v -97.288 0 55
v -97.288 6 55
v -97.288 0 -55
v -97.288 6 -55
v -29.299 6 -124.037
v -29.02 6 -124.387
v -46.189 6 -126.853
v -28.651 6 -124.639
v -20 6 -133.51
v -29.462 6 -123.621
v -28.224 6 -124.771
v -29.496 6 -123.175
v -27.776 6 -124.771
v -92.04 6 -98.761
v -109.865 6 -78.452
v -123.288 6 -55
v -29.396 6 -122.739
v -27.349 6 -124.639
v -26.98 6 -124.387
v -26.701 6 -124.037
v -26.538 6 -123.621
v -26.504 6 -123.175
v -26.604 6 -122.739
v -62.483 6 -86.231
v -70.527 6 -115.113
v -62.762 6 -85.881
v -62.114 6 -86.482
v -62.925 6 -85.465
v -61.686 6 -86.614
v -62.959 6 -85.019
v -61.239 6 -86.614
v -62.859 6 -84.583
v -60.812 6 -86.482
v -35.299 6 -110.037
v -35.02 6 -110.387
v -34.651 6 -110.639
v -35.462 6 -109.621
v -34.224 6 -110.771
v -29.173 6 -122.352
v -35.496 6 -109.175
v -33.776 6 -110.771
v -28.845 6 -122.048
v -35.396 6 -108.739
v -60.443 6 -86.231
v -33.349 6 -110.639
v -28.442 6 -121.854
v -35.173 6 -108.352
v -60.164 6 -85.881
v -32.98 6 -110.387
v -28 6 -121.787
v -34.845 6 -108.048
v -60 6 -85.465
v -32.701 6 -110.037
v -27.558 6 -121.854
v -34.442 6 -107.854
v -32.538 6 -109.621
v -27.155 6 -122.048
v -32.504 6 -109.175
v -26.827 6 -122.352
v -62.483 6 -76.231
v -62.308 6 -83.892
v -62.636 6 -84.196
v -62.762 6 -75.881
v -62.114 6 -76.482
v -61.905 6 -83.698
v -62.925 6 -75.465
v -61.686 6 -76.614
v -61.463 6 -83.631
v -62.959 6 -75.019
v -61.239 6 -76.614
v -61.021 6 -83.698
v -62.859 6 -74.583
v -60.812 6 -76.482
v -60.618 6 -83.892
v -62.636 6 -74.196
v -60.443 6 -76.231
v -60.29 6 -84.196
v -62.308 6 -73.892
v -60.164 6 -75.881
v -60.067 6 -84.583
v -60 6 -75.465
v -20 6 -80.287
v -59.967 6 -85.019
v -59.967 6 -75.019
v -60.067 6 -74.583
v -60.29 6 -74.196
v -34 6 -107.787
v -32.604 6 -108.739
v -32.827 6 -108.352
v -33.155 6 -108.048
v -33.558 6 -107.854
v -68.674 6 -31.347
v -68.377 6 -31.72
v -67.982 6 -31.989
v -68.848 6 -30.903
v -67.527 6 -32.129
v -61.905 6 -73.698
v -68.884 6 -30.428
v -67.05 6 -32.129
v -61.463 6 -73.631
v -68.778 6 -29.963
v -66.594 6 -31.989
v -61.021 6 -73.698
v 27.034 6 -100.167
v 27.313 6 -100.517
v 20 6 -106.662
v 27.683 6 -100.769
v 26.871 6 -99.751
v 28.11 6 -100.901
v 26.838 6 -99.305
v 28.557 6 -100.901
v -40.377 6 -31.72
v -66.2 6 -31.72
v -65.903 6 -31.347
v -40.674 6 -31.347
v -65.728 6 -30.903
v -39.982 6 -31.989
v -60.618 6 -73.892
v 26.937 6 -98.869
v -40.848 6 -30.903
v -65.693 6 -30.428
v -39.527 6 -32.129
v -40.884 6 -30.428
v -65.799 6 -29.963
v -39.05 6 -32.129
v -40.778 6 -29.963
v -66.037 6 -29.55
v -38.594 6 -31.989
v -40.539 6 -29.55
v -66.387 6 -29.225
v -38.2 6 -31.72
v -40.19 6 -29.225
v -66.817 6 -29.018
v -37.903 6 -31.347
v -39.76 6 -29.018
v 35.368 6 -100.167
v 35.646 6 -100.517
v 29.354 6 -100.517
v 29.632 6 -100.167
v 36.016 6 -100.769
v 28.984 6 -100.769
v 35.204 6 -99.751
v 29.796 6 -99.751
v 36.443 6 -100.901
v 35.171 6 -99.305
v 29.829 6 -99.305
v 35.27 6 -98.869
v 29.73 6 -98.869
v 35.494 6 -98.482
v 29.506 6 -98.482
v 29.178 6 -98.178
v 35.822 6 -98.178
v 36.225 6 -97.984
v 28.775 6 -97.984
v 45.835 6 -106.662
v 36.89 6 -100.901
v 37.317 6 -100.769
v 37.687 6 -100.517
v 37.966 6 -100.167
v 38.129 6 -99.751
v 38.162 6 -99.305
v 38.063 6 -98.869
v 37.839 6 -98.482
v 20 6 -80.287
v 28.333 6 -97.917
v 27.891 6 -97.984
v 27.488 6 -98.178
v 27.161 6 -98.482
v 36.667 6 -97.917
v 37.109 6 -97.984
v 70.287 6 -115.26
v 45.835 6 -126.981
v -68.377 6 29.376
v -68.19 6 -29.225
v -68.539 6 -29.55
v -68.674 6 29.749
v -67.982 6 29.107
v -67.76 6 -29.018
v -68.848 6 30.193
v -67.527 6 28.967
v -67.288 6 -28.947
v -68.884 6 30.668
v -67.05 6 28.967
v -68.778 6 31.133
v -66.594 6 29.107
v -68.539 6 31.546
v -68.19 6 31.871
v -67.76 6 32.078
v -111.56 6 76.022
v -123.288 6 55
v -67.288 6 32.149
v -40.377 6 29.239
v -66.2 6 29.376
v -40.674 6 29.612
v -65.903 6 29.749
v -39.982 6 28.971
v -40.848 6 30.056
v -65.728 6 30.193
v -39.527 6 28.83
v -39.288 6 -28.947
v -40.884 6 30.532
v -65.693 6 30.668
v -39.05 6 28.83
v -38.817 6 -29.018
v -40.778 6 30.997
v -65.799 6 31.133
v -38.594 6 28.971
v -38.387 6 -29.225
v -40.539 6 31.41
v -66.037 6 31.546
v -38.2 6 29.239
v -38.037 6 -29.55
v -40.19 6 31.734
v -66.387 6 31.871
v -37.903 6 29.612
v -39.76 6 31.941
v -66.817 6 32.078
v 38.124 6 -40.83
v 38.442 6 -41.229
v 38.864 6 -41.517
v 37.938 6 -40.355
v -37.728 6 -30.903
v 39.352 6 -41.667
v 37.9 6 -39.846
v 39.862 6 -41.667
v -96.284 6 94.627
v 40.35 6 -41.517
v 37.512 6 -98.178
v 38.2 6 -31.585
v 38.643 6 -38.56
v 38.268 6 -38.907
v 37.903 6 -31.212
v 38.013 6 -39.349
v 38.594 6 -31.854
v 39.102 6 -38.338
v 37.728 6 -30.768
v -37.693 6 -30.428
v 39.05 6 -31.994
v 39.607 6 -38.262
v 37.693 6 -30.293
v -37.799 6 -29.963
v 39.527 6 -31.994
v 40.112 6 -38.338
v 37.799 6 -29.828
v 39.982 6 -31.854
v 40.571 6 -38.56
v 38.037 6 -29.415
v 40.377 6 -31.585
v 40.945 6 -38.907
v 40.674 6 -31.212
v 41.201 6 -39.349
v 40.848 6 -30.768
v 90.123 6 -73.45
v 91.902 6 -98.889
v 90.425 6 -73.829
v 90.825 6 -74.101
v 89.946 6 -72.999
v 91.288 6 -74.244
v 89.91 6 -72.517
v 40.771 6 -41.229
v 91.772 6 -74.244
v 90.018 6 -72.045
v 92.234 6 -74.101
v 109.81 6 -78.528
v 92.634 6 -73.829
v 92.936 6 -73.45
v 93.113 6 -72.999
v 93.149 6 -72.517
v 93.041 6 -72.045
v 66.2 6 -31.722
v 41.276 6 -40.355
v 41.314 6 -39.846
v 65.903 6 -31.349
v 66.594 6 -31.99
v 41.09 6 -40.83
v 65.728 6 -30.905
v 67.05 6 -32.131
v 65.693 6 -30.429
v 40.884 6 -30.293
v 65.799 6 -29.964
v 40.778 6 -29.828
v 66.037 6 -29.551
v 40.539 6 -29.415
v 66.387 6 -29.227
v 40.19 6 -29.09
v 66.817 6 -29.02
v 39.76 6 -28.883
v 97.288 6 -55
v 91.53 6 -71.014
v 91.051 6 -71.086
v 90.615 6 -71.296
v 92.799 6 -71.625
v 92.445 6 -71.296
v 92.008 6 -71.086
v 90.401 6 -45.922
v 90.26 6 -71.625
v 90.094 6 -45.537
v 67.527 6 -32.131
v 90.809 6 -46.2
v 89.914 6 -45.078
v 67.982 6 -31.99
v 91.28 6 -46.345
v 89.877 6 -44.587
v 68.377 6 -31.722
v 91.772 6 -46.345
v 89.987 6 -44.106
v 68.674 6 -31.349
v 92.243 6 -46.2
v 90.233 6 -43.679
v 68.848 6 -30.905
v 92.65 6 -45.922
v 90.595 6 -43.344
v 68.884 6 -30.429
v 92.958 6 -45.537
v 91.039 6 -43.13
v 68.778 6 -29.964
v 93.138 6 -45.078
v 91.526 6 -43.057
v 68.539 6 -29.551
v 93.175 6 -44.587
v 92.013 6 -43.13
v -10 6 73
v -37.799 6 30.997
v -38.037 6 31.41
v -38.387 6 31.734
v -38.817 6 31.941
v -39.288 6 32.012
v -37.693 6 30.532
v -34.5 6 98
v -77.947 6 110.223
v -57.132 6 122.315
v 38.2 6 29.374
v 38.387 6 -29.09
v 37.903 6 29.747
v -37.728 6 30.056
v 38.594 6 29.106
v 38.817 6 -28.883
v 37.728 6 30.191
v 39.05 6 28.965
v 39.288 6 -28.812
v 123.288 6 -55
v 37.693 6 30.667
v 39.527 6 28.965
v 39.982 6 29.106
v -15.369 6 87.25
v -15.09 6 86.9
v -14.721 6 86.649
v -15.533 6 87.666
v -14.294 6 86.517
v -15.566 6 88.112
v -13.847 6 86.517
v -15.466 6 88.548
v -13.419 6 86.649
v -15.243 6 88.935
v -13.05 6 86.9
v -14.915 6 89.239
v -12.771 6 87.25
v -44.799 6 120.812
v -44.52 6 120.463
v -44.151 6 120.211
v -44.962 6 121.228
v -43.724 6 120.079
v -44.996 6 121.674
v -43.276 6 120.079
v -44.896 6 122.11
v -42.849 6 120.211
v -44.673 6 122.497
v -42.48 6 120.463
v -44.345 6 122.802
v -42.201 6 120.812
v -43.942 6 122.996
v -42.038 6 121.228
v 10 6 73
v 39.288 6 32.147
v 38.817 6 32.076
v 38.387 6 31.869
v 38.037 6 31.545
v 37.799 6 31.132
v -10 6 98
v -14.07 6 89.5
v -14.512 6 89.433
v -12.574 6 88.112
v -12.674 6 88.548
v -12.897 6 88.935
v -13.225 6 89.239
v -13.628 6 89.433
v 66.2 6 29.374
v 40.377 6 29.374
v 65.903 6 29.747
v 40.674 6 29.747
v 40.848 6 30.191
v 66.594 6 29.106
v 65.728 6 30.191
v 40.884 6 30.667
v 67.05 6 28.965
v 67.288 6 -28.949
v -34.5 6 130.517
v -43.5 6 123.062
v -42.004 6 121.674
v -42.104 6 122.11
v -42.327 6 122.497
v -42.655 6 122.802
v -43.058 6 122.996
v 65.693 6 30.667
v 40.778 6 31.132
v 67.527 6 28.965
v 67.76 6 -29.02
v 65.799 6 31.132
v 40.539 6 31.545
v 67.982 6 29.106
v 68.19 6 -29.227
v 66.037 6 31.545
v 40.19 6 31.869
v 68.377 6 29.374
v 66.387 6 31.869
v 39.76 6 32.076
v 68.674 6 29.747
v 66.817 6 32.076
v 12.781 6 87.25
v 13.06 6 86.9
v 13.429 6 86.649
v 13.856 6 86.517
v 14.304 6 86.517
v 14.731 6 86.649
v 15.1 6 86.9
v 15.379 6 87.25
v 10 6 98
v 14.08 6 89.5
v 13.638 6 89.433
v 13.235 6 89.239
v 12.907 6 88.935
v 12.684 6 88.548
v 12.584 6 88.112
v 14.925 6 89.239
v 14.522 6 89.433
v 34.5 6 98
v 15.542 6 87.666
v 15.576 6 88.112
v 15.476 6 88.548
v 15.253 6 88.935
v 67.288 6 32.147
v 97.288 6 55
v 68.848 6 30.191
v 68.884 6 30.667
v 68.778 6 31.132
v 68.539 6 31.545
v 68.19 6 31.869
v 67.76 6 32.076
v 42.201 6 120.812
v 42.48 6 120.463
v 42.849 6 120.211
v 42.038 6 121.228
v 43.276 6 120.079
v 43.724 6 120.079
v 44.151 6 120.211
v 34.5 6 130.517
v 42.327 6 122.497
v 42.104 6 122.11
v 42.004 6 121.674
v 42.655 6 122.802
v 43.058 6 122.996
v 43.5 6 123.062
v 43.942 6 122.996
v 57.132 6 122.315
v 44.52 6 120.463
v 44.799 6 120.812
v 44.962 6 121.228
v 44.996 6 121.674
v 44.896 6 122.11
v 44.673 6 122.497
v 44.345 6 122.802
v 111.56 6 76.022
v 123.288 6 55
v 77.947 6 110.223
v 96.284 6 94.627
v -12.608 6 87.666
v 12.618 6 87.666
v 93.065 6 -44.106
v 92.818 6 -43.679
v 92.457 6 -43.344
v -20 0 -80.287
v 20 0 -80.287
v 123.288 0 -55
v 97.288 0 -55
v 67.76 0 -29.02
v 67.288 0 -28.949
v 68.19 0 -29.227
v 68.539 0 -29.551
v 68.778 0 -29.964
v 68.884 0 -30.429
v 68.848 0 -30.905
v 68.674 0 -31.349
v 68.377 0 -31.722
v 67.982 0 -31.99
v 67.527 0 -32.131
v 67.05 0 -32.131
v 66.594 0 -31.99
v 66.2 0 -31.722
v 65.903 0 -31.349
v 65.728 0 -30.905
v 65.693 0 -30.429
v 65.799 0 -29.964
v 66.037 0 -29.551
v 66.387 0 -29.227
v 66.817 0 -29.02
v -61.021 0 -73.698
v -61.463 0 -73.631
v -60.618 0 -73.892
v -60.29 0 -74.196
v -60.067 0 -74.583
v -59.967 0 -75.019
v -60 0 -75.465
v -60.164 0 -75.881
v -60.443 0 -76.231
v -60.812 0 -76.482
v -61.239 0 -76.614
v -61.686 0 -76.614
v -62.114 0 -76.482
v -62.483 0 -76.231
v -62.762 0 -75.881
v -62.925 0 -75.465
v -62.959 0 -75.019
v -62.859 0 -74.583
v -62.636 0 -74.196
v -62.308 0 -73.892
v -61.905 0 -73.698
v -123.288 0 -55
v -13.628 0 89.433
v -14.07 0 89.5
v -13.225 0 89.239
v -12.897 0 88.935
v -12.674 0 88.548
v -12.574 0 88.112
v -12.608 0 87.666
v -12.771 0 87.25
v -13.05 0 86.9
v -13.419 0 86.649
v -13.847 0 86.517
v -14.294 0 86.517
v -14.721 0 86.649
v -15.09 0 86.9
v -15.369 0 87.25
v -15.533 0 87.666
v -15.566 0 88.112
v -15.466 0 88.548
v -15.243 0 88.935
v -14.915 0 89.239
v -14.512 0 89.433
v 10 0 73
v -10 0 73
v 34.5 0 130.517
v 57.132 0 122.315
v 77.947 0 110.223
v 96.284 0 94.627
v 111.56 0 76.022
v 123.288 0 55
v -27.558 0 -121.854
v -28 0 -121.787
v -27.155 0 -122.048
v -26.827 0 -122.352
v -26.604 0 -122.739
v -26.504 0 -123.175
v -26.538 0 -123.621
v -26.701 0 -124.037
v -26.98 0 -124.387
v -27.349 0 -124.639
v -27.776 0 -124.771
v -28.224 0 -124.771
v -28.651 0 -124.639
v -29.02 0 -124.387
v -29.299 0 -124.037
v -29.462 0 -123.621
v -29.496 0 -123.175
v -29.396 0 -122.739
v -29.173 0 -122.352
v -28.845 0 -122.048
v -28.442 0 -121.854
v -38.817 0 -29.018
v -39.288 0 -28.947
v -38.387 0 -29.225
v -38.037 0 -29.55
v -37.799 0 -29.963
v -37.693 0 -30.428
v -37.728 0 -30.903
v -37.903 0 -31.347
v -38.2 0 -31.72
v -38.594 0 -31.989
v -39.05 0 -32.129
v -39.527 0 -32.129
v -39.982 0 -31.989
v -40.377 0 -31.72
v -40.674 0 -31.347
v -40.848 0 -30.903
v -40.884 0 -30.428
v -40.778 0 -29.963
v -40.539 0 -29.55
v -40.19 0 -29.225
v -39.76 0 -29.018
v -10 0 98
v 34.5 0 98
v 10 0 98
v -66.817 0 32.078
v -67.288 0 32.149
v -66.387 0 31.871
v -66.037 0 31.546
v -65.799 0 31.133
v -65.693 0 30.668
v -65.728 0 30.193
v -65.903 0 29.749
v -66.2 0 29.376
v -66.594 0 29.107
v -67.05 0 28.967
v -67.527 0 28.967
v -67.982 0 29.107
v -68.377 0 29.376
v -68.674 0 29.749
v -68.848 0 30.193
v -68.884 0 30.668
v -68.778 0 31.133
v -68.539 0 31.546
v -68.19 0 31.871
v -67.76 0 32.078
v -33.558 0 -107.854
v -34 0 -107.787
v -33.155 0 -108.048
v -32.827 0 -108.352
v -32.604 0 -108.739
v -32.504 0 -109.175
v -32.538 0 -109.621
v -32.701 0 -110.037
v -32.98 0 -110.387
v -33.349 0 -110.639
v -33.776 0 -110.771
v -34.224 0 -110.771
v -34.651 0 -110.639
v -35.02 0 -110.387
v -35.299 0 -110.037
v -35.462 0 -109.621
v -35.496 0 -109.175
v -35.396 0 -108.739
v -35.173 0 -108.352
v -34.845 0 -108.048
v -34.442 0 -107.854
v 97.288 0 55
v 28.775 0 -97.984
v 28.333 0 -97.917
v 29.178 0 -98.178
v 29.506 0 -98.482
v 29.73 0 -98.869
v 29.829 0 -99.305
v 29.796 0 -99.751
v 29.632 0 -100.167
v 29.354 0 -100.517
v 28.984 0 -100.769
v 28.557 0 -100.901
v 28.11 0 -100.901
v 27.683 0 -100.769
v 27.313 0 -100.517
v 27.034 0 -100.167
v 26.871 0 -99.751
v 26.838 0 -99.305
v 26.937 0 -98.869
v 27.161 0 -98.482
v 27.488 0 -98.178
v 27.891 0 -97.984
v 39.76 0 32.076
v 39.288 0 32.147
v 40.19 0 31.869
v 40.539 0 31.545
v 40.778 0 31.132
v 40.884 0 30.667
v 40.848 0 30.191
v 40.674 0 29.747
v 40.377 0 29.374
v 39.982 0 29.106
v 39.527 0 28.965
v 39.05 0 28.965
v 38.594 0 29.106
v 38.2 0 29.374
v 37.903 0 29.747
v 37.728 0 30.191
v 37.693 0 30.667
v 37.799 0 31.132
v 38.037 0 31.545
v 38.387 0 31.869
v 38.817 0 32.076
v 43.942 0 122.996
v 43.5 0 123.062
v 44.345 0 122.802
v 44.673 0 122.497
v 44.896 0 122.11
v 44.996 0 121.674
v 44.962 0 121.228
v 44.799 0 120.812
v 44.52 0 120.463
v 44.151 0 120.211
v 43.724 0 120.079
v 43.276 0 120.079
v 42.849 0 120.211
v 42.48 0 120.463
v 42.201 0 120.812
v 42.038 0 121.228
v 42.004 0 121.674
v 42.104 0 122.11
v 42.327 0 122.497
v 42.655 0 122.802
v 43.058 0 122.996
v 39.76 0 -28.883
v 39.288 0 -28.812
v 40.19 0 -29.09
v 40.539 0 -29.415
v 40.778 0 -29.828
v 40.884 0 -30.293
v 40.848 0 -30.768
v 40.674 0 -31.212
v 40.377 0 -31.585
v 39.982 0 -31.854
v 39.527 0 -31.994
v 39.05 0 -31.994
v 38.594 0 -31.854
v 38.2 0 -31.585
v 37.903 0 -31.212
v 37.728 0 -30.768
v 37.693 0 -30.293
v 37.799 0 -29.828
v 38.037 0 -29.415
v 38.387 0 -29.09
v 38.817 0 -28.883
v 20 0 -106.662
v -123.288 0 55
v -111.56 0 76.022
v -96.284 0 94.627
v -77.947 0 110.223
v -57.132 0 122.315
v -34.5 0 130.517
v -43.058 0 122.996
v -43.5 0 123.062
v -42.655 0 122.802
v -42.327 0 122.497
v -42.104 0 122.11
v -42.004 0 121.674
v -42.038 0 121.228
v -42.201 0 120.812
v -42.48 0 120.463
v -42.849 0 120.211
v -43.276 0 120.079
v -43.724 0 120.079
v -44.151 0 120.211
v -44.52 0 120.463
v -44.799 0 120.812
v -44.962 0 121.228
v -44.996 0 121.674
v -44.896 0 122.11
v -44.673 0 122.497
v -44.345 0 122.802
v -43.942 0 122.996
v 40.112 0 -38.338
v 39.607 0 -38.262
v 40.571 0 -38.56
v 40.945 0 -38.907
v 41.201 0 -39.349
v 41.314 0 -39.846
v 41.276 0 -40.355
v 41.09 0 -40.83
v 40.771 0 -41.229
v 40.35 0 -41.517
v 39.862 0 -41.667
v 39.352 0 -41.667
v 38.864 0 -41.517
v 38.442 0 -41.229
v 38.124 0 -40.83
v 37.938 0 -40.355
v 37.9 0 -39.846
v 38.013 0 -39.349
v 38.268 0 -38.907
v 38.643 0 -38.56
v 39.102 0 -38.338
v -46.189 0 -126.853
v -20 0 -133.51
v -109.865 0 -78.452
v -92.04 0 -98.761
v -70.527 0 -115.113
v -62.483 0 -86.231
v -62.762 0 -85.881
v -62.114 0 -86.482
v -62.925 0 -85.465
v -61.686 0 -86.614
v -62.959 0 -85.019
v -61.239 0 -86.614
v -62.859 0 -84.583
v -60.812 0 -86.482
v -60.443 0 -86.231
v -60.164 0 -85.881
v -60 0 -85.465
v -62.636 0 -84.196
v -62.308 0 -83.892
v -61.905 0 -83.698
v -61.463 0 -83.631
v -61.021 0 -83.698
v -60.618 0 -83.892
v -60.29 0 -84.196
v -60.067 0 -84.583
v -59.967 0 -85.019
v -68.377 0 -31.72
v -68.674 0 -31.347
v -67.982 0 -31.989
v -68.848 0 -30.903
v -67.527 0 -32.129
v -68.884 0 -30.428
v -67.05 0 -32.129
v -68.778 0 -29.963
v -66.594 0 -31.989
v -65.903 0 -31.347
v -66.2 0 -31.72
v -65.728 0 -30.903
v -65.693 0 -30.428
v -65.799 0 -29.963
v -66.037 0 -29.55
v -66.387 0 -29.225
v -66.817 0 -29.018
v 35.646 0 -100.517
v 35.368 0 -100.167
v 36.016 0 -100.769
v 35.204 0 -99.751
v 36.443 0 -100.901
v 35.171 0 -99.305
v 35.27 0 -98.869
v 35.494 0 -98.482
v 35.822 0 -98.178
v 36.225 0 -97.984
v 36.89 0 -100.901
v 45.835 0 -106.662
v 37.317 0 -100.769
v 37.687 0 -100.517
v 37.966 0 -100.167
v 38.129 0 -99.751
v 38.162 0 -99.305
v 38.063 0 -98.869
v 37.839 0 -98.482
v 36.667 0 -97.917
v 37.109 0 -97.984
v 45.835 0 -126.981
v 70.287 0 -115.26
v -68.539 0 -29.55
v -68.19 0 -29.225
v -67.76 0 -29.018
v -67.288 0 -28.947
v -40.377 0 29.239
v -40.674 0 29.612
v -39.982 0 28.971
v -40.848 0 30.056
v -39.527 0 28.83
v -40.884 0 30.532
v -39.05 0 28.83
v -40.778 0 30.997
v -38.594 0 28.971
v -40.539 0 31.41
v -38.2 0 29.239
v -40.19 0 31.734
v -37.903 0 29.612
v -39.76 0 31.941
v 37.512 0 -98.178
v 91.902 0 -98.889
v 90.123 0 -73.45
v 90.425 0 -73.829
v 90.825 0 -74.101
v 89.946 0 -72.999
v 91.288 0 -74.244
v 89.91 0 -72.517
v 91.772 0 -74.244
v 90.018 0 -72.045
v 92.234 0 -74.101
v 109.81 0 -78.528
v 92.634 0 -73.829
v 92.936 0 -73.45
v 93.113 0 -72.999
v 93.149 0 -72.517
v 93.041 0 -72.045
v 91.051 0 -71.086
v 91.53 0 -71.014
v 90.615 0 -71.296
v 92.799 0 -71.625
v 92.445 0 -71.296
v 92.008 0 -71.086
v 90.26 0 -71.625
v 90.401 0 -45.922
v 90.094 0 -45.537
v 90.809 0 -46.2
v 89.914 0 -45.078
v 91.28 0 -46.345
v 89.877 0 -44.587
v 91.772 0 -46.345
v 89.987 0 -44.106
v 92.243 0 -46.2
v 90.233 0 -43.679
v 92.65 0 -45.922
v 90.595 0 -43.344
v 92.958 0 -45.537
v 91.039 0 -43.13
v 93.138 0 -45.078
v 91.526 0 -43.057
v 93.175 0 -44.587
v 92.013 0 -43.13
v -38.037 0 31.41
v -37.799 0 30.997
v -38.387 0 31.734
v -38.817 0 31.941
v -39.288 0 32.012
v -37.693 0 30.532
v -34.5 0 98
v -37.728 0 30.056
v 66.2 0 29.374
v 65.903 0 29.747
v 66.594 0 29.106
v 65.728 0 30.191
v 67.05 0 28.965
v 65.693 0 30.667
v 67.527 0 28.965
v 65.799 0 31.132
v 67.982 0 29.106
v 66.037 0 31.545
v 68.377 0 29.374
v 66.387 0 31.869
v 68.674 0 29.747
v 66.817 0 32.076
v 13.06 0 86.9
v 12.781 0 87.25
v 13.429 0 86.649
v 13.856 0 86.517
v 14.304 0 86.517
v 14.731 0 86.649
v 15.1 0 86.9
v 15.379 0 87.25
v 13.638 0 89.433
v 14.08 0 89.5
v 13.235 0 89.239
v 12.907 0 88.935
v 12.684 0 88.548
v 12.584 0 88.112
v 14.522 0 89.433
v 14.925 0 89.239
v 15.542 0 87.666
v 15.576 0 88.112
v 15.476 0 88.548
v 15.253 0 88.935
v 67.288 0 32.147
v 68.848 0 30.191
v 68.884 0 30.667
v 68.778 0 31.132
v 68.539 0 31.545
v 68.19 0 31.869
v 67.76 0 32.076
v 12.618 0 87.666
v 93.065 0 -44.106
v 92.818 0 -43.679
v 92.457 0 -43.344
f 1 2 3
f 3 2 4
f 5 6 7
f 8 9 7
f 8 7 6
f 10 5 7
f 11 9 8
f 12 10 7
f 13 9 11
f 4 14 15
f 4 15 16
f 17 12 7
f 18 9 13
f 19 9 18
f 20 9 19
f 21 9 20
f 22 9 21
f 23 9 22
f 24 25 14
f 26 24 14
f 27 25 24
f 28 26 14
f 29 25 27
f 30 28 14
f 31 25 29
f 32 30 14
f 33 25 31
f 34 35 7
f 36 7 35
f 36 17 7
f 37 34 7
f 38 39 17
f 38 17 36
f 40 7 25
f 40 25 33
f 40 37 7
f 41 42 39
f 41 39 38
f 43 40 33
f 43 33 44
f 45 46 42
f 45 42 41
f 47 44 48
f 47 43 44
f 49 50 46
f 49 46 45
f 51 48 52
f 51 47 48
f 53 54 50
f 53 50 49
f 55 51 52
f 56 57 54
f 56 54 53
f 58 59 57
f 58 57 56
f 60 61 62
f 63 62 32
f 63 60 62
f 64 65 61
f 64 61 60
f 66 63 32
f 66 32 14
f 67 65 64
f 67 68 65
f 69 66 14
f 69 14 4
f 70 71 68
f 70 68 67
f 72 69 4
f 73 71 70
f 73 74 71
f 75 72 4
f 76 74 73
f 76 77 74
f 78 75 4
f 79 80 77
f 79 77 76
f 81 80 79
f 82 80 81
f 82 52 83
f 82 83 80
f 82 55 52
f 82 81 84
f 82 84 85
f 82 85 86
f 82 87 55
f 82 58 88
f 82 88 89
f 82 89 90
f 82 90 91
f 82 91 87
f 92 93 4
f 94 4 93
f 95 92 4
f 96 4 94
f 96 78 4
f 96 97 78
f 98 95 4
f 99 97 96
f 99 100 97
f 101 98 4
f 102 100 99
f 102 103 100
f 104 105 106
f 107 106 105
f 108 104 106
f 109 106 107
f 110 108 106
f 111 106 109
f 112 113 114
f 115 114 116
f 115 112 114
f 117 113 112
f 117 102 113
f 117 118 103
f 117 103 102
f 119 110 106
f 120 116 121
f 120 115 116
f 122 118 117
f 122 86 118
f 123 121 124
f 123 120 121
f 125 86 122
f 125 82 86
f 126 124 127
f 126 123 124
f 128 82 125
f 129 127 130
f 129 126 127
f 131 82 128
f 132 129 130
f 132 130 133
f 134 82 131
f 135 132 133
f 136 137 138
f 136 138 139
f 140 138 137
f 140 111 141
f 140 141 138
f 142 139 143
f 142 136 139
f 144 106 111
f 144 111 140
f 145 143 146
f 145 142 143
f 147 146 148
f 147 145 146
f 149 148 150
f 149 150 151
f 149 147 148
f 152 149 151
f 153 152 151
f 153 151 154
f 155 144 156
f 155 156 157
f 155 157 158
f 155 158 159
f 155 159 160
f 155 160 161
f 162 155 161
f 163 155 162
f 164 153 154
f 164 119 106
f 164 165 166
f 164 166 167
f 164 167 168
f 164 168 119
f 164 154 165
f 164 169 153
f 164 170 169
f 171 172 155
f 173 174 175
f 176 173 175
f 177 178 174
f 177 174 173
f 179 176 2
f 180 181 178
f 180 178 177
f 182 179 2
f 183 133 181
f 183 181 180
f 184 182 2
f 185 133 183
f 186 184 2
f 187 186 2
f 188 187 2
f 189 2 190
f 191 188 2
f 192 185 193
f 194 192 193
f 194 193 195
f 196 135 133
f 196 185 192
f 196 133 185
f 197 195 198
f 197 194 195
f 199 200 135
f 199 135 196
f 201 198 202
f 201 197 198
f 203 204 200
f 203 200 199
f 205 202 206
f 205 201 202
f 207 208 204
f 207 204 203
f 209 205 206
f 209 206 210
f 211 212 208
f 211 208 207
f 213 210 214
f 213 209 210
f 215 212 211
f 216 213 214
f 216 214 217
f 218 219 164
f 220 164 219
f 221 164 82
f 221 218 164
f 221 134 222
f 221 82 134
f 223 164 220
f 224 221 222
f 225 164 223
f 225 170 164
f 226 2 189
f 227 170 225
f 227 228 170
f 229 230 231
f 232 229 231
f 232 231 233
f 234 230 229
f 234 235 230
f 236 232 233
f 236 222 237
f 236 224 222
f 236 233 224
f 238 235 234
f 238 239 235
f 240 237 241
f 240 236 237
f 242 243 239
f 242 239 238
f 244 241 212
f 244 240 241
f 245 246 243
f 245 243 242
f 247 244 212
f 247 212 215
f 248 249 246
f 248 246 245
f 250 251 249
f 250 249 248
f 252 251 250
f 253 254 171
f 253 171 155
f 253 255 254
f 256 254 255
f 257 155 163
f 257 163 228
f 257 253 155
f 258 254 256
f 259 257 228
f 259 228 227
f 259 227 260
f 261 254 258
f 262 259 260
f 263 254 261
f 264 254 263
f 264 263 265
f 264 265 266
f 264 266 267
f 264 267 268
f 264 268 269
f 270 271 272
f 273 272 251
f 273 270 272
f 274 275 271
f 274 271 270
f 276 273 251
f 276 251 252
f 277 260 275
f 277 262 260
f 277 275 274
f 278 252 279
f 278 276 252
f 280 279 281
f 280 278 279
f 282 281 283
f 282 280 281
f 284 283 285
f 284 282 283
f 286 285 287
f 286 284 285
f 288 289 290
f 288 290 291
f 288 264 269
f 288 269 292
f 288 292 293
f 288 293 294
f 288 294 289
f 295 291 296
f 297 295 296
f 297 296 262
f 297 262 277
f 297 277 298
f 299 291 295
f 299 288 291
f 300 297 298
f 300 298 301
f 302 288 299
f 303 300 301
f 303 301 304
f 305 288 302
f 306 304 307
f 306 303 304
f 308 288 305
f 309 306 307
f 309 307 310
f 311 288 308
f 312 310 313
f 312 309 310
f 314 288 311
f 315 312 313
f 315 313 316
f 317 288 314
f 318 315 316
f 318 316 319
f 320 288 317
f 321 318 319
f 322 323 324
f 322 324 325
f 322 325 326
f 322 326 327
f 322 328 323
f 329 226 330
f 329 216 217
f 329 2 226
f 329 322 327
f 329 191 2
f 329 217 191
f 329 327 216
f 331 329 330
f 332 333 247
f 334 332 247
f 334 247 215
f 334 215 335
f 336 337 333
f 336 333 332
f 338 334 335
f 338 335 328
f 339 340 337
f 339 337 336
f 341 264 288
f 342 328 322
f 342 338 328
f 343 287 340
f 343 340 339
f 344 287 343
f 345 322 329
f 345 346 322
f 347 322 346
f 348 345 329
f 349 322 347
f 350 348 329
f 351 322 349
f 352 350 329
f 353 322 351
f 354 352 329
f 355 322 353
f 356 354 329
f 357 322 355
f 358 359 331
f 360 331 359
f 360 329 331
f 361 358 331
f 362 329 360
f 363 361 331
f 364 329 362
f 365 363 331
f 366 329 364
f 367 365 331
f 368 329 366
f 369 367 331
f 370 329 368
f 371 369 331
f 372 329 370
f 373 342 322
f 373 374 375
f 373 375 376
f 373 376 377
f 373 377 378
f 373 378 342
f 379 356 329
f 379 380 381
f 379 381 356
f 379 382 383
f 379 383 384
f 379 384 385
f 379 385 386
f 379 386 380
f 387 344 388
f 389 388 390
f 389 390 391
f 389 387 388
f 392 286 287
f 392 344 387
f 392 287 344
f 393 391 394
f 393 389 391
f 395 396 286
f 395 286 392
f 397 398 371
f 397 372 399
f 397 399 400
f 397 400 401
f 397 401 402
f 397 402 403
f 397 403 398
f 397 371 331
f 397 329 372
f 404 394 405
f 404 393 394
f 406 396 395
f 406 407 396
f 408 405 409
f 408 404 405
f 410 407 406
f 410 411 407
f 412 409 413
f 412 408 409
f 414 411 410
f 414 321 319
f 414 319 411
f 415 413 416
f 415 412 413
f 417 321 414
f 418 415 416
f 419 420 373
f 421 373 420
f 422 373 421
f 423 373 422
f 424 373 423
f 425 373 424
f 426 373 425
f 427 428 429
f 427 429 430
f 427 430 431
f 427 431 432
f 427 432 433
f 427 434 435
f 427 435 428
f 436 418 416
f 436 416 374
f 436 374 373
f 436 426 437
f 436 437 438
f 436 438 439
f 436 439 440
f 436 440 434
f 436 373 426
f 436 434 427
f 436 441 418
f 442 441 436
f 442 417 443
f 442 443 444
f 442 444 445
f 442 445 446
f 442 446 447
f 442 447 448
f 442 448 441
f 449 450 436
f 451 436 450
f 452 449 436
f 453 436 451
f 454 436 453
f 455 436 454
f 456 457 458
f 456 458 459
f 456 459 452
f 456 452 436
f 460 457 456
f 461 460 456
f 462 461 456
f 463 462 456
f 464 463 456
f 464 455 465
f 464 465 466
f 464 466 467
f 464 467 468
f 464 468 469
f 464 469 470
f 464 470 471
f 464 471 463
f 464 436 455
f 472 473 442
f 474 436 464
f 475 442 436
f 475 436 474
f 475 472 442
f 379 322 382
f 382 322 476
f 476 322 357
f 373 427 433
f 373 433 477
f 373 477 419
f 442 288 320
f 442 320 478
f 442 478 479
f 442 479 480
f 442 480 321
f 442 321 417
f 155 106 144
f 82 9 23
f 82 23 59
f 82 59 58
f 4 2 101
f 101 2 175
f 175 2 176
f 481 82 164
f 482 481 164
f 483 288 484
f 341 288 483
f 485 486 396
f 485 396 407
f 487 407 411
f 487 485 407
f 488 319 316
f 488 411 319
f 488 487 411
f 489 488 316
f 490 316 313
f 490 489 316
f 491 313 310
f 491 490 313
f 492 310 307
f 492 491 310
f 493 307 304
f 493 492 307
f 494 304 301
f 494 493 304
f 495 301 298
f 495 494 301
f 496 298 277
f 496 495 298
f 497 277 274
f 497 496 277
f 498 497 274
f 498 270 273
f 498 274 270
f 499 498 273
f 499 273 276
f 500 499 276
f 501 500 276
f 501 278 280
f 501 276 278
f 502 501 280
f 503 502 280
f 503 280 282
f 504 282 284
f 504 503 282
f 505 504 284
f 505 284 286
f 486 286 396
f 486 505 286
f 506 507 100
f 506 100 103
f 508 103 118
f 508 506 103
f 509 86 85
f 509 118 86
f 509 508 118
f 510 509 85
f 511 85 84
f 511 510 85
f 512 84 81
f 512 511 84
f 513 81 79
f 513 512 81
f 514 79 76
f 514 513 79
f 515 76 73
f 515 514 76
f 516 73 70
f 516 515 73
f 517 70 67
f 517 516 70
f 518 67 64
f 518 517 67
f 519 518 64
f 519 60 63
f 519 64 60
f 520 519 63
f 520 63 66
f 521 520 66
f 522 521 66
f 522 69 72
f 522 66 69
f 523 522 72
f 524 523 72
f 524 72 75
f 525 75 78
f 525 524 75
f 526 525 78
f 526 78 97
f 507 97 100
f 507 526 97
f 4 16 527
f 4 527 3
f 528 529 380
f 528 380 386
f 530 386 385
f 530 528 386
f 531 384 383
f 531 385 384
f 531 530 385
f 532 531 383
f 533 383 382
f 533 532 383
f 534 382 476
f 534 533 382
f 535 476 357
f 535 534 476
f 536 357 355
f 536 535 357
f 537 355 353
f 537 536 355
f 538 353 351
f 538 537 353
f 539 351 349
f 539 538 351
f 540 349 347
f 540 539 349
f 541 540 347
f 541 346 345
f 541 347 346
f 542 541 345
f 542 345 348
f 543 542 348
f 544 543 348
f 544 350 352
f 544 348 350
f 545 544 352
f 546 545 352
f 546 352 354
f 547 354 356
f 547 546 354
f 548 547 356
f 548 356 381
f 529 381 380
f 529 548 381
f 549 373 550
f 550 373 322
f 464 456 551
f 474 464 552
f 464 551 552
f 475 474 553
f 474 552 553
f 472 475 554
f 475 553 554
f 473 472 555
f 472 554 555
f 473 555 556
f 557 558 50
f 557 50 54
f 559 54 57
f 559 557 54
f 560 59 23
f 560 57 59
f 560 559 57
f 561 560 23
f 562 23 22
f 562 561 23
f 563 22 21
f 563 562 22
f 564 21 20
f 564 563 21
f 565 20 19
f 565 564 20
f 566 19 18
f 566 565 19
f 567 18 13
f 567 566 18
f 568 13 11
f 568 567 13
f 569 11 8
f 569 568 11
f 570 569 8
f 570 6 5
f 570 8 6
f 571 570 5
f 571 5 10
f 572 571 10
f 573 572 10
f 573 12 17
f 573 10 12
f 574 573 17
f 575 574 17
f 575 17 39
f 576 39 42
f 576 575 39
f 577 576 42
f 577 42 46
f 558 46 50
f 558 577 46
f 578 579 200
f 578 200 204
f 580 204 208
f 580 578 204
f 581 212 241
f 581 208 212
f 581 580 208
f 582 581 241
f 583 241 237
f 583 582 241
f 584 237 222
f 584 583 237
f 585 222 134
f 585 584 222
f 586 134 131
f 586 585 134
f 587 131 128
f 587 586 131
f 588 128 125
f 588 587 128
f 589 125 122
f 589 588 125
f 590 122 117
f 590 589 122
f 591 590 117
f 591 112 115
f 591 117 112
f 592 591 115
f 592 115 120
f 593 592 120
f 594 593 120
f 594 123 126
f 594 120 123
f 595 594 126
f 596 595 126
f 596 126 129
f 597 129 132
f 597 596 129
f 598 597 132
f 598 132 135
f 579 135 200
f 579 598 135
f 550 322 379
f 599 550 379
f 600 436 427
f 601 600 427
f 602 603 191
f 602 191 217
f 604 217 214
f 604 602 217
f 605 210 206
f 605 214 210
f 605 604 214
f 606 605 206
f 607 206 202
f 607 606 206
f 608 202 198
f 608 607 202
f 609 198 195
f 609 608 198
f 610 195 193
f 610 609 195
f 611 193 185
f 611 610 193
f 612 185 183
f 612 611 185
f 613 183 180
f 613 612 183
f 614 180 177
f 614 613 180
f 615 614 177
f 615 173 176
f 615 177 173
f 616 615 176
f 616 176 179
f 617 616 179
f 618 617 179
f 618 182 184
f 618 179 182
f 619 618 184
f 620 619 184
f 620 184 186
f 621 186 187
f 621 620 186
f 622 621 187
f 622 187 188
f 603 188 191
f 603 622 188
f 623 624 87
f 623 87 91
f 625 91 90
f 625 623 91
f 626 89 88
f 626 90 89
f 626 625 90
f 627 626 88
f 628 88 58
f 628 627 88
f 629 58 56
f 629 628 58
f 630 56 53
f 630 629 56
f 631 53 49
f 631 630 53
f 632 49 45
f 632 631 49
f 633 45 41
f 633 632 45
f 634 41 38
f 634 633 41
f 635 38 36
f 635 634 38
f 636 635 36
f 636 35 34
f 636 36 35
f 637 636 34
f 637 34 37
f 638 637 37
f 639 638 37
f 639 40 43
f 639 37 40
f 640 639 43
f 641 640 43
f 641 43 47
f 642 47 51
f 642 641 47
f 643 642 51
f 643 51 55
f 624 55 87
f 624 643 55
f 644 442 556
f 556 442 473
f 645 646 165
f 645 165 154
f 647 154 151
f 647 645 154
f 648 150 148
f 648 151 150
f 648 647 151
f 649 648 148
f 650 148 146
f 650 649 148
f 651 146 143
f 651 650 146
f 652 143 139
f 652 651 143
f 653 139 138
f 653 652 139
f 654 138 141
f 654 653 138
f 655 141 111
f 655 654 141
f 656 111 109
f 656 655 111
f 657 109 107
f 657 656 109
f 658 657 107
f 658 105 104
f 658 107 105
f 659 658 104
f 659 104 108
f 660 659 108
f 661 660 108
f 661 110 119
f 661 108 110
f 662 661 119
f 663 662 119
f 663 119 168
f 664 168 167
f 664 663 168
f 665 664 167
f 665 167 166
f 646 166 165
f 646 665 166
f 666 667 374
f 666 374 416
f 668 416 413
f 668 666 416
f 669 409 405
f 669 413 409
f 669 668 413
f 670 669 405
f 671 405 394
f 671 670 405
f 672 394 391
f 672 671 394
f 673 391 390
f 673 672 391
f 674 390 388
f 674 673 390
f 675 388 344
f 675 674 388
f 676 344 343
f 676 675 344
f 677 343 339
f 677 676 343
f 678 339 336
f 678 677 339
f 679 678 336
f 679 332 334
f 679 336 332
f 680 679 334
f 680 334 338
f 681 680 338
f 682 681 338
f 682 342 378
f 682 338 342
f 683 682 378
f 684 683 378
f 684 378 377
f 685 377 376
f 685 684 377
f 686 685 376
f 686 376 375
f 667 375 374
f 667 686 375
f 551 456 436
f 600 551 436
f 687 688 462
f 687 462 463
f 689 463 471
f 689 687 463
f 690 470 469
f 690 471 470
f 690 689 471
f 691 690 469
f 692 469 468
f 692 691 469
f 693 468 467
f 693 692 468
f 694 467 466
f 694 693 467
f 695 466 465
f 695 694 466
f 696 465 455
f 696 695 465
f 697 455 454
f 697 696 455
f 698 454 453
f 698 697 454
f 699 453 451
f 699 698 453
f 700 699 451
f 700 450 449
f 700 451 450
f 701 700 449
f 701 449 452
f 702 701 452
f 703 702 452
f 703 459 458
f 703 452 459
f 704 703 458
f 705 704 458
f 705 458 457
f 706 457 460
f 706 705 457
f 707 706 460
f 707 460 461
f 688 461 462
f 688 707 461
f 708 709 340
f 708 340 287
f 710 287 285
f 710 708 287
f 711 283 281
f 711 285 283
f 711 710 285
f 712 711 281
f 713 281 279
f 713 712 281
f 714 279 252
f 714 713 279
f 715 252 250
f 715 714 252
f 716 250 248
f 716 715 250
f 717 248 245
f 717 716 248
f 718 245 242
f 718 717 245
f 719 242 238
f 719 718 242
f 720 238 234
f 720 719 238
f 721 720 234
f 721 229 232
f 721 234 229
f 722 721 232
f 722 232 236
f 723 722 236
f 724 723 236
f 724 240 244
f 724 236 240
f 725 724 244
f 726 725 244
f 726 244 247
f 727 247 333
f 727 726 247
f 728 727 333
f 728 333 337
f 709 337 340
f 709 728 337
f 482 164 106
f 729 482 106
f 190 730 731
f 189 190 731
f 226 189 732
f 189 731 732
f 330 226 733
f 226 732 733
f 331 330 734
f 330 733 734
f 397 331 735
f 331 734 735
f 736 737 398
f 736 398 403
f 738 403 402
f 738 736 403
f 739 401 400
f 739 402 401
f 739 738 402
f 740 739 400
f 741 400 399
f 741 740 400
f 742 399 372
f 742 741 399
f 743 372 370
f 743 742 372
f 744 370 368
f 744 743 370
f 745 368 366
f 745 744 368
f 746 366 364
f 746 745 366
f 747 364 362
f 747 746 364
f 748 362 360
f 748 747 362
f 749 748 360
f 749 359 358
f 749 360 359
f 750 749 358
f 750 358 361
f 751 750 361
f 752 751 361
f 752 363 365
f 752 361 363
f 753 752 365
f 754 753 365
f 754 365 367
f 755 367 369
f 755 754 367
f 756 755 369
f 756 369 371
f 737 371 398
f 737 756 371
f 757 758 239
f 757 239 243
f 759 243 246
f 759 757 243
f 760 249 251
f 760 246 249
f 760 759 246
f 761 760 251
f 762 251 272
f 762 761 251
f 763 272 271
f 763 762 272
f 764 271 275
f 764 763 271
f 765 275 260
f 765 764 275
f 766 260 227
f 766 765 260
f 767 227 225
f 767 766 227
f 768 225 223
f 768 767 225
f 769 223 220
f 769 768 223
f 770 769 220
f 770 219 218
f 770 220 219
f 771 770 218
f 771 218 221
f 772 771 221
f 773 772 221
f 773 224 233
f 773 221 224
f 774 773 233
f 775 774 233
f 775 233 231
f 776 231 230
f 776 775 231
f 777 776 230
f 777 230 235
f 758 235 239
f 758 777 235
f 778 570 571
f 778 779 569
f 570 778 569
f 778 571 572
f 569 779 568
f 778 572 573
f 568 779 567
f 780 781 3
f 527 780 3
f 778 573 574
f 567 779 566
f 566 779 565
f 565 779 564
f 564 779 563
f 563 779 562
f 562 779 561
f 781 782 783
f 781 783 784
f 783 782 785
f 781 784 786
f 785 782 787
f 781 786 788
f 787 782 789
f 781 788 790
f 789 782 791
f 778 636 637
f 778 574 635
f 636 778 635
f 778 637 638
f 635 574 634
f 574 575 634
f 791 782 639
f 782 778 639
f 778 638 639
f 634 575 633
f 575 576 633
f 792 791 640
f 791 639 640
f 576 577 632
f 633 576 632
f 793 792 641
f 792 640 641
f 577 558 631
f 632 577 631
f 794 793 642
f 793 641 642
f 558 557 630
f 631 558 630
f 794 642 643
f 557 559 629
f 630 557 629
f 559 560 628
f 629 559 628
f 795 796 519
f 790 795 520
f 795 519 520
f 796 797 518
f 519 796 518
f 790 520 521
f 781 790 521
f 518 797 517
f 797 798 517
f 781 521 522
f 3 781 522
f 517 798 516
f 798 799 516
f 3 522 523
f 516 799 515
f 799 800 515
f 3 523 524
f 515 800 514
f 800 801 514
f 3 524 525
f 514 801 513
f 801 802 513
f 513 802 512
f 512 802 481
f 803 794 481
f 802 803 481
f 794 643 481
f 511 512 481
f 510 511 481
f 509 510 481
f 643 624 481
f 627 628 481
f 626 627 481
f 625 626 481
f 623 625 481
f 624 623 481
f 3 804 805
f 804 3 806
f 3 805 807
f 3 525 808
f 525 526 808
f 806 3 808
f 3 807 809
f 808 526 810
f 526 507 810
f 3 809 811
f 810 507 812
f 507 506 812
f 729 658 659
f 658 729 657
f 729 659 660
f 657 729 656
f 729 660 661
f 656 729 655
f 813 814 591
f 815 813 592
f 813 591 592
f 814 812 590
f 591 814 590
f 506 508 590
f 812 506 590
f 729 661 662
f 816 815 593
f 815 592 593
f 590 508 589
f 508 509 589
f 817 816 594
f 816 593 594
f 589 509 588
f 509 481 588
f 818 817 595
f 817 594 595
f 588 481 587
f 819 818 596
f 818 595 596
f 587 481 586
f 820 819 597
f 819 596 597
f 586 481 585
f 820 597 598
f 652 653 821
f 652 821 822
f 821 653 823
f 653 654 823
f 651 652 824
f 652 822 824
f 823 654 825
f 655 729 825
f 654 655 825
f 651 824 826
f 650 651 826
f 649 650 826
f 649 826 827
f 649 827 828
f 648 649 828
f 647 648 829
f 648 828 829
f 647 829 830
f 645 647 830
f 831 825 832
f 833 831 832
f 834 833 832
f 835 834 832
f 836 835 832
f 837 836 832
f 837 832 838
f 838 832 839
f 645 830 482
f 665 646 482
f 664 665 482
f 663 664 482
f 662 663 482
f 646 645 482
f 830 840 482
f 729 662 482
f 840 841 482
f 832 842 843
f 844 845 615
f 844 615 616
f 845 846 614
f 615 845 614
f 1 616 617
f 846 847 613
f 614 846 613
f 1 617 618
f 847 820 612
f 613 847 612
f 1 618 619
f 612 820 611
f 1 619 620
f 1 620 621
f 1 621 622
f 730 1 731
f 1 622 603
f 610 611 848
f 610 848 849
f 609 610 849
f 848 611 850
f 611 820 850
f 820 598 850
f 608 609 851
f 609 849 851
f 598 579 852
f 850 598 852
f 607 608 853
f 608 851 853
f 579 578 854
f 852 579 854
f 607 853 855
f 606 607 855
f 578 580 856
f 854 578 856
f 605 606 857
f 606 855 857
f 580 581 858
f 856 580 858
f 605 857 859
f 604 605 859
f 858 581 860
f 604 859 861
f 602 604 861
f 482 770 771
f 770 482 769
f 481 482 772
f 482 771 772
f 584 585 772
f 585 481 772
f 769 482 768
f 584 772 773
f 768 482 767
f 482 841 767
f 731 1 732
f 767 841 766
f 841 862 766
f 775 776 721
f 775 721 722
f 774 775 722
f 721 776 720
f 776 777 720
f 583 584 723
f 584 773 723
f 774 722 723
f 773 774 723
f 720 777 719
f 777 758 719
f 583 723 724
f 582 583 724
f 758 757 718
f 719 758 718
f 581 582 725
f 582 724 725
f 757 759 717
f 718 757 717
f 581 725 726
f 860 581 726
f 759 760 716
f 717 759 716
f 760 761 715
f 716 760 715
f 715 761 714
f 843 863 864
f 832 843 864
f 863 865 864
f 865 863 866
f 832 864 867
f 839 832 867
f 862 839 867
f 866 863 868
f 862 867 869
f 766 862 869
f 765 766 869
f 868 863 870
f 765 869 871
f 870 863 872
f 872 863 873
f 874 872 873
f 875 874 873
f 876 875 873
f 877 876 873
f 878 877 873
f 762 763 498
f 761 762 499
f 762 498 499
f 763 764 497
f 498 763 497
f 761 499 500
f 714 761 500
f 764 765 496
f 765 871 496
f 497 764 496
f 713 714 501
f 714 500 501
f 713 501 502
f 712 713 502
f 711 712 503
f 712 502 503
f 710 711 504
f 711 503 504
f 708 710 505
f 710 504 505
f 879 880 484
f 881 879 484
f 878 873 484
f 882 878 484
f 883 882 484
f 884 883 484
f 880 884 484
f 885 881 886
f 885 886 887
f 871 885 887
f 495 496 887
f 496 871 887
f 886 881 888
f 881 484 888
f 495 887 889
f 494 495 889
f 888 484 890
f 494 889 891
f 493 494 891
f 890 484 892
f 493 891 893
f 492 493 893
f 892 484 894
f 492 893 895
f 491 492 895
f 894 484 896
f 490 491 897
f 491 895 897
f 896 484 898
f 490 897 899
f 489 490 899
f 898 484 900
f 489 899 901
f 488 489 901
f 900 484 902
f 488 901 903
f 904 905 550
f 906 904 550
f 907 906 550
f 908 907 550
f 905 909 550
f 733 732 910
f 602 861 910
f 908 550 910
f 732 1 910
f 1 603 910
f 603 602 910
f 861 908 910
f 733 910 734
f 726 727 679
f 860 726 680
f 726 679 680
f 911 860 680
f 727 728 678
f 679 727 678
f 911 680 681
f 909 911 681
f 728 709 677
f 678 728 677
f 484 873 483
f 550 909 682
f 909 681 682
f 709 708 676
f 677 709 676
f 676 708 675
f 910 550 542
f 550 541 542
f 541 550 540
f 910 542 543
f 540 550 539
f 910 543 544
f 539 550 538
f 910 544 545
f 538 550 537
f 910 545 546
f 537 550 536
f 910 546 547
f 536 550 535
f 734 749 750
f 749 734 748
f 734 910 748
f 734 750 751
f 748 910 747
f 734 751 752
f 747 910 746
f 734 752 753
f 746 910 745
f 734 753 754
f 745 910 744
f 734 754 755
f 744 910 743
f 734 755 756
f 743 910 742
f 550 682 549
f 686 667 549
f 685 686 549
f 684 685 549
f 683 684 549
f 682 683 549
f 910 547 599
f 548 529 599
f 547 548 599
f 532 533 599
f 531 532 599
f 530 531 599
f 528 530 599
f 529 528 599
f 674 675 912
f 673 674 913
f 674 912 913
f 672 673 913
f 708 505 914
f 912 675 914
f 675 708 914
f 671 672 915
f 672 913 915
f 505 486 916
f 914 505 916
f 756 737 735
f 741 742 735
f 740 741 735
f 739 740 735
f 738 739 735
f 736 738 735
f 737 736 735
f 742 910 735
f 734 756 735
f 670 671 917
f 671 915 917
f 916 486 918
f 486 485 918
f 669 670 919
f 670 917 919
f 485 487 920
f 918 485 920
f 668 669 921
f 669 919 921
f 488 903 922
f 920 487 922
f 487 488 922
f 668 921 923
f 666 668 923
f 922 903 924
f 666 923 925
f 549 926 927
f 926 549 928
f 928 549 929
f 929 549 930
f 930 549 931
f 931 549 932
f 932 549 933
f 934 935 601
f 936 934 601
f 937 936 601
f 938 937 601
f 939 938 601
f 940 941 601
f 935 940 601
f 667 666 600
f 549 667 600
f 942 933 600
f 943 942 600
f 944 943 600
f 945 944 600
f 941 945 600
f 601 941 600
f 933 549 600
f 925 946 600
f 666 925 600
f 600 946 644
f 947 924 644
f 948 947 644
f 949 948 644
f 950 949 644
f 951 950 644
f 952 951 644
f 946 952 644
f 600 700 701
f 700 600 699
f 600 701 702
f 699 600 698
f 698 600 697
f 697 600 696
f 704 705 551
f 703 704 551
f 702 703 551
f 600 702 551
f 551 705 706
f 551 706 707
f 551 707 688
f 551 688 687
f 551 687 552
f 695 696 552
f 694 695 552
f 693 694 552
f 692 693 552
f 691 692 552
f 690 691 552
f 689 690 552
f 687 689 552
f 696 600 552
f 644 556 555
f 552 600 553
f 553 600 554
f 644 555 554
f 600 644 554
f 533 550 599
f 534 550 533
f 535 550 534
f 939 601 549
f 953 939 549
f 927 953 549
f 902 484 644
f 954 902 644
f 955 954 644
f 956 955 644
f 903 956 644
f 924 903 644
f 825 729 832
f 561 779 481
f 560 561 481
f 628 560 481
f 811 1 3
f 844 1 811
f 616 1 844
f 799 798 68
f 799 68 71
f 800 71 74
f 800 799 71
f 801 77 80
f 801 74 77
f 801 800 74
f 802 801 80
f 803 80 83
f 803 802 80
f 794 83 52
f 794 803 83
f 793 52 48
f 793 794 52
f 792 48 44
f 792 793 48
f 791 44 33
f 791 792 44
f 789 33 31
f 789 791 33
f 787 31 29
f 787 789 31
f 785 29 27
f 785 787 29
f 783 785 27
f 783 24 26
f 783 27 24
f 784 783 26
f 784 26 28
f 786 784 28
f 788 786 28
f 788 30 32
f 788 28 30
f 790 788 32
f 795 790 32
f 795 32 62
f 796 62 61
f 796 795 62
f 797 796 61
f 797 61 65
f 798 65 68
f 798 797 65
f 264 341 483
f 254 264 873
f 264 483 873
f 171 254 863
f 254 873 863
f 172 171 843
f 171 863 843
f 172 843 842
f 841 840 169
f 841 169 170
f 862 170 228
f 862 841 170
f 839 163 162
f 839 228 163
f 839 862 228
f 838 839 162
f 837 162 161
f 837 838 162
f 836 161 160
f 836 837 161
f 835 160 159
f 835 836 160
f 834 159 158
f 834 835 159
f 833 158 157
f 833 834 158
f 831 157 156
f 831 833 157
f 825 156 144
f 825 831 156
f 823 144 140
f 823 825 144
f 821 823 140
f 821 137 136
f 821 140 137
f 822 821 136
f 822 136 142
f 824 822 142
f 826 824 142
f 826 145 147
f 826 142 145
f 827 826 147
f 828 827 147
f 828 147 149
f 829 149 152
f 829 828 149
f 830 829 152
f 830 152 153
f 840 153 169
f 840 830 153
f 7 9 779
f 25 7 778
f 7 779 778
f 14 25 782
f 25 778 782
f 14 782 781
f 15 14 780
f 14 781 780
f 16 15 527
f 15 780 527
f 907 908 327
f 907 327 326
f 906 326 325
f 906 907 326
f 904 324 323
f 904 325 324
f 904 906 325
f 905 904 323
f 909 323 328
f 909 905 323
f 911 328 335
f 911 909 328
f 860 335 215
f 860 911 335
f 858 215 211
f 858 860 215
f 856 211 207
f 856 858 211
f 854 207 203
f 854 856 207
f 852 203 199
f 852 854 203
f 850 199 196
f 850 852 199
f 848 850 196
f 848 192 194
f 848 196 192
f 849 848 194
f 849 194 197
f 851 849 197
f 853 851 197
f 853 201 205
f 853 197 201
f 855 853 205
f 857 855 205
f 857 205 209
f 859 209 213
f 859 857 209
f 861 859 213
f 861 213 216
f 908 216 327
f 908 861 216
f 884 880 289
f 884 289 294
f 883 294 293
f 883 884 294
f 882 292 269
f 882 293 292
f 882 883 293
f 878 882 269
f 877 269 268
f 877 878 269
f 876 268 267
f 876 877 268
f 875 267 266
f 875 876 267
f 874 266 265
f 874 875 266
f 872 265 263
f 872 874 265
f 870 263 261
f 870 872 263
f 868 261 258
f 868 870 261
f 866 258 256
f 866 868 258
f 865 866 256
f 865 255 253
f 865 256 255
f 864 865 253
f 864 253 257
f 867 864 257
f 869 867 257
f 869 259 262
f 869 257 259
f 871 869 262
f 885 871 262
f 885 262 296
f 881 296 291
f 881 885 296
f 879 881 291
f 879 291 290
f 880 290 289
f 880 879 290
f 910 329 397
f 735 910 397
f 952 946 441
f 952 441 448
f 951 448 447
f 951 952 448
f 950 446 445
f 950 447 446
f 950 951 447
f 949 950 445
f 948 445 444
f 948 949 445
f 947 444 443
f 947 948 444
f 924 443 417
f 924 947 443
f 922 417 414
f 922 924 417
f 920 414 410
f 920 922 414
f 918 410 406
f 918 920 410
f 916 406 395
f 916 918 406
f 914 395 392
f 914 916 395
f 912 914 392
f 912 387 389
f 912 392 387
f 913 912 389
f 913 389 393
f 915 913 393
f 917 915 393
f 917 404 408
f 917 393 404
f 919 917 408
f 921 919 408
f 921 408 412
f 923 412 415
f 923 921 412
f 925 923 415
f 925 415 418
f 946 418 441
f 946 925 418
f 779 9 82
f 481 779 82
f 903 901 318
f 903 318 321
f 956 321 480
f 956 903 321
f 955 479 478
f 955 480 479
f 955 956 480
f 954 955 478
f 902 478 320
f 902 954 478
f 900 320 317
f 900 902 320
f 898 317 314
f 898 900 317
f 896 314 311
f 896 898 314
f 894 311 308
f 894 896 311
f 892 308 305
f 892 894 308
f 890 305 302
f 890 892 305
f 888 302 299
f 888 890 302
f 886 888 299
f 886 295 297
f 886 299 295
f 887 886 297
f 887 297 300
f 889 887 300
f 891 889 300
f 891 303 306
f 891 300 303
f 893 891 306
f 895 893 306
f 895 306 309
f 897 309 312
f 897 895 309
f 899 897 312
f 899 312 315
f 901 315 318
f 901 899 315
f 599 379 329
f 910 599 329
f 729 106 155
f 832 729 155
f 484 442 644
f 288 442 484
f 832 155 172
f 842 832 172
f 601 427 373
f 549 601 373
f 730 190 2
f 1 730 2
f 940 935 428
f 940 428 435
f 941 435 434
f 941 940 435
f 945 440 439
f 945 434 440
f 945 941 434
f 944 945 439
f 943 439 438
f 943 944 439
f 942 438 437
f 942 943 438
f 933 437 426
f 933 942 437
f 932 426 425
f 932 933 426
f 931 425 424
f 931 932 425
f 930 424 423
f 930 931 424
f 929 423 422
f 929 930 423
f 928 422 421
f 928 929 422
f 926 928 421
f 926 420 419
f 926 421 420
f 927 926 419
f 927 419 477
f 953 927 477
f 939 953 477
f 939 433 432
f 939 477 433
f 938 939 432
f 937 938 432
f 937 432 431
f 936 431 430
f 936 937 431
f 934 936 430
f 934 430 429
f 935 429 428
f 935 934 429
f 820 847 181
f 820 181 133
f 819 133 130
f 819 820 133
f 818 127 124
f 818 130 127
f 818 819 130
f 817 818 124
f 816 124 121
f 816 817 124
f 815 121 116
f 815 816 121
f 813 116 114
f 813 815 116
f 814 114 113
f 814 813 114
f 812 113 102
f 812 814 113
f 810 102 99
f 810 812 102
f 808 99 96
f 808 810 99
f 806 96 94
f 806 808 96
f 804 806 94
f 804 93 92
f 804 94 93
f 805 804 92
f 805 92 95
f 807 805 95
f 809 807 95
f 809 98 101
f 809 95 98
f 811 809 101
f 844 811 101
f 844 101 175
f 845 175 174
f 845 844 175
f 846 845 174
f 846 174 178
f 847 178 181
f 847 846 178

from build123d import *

# Parameters (mm, degrees)
ESQUISSE1_R                   = 135
BOSS_EXTRU_1_DEPTH            = 6
ESQUISSE2_W                   = 112.183682252
ESQUISSE2_H                   = 110
ESQUISSE2_W_2                 = 110.90382882
ENL_V_MAT_EXTRU_12_DEPTH      = 10
ENL_V_MAT_EXTRU_13_DEPTH      = 183.92348127
ENL_V_MAT_EXTRU_14_DEPTH      = 182.826840703
ENL_V_MAT_EXTRU_14_DEPTH_BACK = 182.826840703
ESQUISSE4_R                   = 1.653250653
ESQUISSE4_R_2                 = 1.624051272
ESQUISSE4_R_3                 = 1.712018077
ESQUISSE4_R_4                 = 1.6
ESQUISSE4_R_5                 = 1.599999728
ESQUISSE4_R_6                 = 1.599999892
ESQUISSE4_R_7                 = 1.599999865
ESQUISSE4_R_8                 = 1.599999855
ESQUISSE4_R_9                 = 1.5


with BuildPart() as part:
    # Esquisse1 → Boss.-Extru.1 (new body)
    with BuildSketch(Plane(origin=(0, 0, 0), x_dir=(1, 0, 0), z_dir=(0, 1, 0))):
        with Locations(Location((0, 0, 0), (0, 0, 270))):
            Circle(ESQUISSE1_R)
    extrude(amount=BOSS_EXTRU_1_DEPTH)

    # Esquisse2 → Enlèv. mat.-Extru.12 (cut)
    with BuildSketch(Plane(origin=(0, 6, 0), x_dir=(1, 0, 0), z_dir=(0, 1, 0))):
        with Locations((153.380121185, 0)):
            Rectangle(ESQUISSE2_W, ESQUISSE2_H)
        with Locations((-152.740194469, 0)):
            Rectangle(ESQUISSE2_W_2, ESQUISSE2_H)
    extrude(amount=-ENL_V_MAT_EXTRU_12_DEPTH, mode=Mode.SUBTRACT)

    # Esquisse3 → Enlèv. mat.-Extru.13 (cut, through all)
    with BuildSketch(Plane(origin=(0, 6, 0), x_dir=(1, 0, 0), z_dir=(0, 1, 0))):
        with BuildLine():
            Line((45.835319933, 106.66240667), (45.835319933, 126.980799519))
            ThreePointArc((45.835319933, 126.980799519), (23.265769543, 132.980088613), (0, 135))
            ThreePointArc((0, 135), (-10.027701736, 134.627059679), (-20, 133.510299228))
            Line((-20, 133.510299228), (-20, 80.28740667))
            Line((-20, 80.28740667), (20, 80.28740667))
            Line((20, 80.28740667), (20, 106.66240667))
            Line((20, 106.66240667), (45.835319933, 106.66240667))
        make_face()
        with BuildLine():
            Line((34.5, -98), (10, -98))
            Line((10, -98), (10, -73))
            Line((10, -73), (-10, -73))
            Line((-10, -73), (-10, -98))
            Line((-10, -98), (-34.5, -98))
            Line((-34.5, -98), (-34.5, -130.517240241))
            ThreePointArc((-34.5, -130.517240241), (-17.395007438, -133.874619388), (0, -135))
            ThreePointArc((0, -135), (17.395007438, -133.874619388), (34.5, -130.517240241))
            Line((34.5, -130.517240241), (34.5, -98))
        make_face()
    extrude(amount=-ENL_V_MAT_EXTRU_13_DEPTH, mode=Mode.SUBTRACT)

    # Esquisse4 → Enlèv. mat.-Extru.14 (cut, two sides: drawn at the far end of the back side and taken through both)
    with BuildSketch(Plane(origin=(0, 6, 0), x_dir=(1, 0, 0), z_dir=(0, 1, 0)).offset(-ENL_V_MAT_EXTRU_14_DEPTH_BACK)):
        with Locations(Location((91.525914299, 44.710203818, 0), (0, 0, 270))):
            Circle(ESQUISSE4_R)
        with Locations(Location((91.529697638, 72.638042273, 0), (0, 0, 270))):
            Circle(ESQUISSE4_R_2)
        with Locations(Location((39.606920151, 39.974167075, 0), (0, 0, 270))):
            Circle(ESQUISSE4_R_3)
        with Locations(Location((67.288280059, 30.548697725, 0), (0, 0, 270))):
            Circle(ESQUISSE4_R_4)
        with Locations(Location((39.288280059, 30.412294197, 0), (0, 0, 270))):
            Circle(ESQUISSE4_R_4)
        with Locations(Location((39.288280059, -30.547108673, 0), (0, 0, 270))):
            Circle(ESQUISSE4_R_5)
        with Locations(Location((67.288280059, -30.547108757, 0), (0, 0, 270))):
            Circle(ESQUISSE4_R_6)
        with Locations(Location((-39.288280059, -30.412294197, 0), (0, 0, 270))):
            Circle(ESQUISSE4_R_4)
        with Locations(Location((-67.288280059, -30.548697725, 0), (0, 0, 270))):
            Circle(ESQUISSE4_R_4)
        with Locations(Location((-67.288280059, 30.547108757, 0), (0, 0, 270))):
            Circle(ESQUISSE4_R_7)
        with Locations(Location((-39.288280059, 30.547108674, 0), (0, 0, 270))):
            Circle(ESQUISSE4_R_8)
        with Locations(Location((-61.462852102, 85.131040367, 0), (0, 0, 270))):
            Circle(ESQUISSE4_R_9)
        with Locations(Location((-61.462852102, 75.131040367, 0), (0, 0, 270))):
            Circle(ESQUISSE4_R_9)
        with Locations(Location((-28, 123.28740667, 0), (0, 0, 270))):
            Circle(ESQUISSE4_R_9)
        with Locations(Location((-34, 109.28740667, 0), (0, 0, 270))):
            Circle(ESQUISSE4_R_9)
        with Locations(Location((28.333333333, 99.41740667, 0), (0, 0, 270))):
            Circle(ESQUISSE4_R_9)
        with Locations(Location((36.666666667, 99.41740667, 0), (0, 0, 270))):
            Circle(ESQUISSE4_R_9)
        with Locations(Location((43.5, -121.562248636, 0), (0, 0, 270))):
            Circle(ESQUISSE4_R_9)
        with Locations(Location((-43.5, -121.562248636, 0), (0, 0, 270))):
            Circle(ESQUISSE4_R_9)
        with Locations(Location((14.08, -88, 0), (0, 0, 270))):
            Circle(ESQUISSE4_R_9)
        with Locations(Location((-14.07013432, -88, 0), (0, 0, 270))):
            Circle(ESQUISSE4_R_9)
    extrude(amount=ENL_V_MAT_EXTRU_14_DEPTH + ENL_V_MAT_EXTRU_14_DEPTH_BACK, mode=Mode.SUBTRACT)


solid = part.part
